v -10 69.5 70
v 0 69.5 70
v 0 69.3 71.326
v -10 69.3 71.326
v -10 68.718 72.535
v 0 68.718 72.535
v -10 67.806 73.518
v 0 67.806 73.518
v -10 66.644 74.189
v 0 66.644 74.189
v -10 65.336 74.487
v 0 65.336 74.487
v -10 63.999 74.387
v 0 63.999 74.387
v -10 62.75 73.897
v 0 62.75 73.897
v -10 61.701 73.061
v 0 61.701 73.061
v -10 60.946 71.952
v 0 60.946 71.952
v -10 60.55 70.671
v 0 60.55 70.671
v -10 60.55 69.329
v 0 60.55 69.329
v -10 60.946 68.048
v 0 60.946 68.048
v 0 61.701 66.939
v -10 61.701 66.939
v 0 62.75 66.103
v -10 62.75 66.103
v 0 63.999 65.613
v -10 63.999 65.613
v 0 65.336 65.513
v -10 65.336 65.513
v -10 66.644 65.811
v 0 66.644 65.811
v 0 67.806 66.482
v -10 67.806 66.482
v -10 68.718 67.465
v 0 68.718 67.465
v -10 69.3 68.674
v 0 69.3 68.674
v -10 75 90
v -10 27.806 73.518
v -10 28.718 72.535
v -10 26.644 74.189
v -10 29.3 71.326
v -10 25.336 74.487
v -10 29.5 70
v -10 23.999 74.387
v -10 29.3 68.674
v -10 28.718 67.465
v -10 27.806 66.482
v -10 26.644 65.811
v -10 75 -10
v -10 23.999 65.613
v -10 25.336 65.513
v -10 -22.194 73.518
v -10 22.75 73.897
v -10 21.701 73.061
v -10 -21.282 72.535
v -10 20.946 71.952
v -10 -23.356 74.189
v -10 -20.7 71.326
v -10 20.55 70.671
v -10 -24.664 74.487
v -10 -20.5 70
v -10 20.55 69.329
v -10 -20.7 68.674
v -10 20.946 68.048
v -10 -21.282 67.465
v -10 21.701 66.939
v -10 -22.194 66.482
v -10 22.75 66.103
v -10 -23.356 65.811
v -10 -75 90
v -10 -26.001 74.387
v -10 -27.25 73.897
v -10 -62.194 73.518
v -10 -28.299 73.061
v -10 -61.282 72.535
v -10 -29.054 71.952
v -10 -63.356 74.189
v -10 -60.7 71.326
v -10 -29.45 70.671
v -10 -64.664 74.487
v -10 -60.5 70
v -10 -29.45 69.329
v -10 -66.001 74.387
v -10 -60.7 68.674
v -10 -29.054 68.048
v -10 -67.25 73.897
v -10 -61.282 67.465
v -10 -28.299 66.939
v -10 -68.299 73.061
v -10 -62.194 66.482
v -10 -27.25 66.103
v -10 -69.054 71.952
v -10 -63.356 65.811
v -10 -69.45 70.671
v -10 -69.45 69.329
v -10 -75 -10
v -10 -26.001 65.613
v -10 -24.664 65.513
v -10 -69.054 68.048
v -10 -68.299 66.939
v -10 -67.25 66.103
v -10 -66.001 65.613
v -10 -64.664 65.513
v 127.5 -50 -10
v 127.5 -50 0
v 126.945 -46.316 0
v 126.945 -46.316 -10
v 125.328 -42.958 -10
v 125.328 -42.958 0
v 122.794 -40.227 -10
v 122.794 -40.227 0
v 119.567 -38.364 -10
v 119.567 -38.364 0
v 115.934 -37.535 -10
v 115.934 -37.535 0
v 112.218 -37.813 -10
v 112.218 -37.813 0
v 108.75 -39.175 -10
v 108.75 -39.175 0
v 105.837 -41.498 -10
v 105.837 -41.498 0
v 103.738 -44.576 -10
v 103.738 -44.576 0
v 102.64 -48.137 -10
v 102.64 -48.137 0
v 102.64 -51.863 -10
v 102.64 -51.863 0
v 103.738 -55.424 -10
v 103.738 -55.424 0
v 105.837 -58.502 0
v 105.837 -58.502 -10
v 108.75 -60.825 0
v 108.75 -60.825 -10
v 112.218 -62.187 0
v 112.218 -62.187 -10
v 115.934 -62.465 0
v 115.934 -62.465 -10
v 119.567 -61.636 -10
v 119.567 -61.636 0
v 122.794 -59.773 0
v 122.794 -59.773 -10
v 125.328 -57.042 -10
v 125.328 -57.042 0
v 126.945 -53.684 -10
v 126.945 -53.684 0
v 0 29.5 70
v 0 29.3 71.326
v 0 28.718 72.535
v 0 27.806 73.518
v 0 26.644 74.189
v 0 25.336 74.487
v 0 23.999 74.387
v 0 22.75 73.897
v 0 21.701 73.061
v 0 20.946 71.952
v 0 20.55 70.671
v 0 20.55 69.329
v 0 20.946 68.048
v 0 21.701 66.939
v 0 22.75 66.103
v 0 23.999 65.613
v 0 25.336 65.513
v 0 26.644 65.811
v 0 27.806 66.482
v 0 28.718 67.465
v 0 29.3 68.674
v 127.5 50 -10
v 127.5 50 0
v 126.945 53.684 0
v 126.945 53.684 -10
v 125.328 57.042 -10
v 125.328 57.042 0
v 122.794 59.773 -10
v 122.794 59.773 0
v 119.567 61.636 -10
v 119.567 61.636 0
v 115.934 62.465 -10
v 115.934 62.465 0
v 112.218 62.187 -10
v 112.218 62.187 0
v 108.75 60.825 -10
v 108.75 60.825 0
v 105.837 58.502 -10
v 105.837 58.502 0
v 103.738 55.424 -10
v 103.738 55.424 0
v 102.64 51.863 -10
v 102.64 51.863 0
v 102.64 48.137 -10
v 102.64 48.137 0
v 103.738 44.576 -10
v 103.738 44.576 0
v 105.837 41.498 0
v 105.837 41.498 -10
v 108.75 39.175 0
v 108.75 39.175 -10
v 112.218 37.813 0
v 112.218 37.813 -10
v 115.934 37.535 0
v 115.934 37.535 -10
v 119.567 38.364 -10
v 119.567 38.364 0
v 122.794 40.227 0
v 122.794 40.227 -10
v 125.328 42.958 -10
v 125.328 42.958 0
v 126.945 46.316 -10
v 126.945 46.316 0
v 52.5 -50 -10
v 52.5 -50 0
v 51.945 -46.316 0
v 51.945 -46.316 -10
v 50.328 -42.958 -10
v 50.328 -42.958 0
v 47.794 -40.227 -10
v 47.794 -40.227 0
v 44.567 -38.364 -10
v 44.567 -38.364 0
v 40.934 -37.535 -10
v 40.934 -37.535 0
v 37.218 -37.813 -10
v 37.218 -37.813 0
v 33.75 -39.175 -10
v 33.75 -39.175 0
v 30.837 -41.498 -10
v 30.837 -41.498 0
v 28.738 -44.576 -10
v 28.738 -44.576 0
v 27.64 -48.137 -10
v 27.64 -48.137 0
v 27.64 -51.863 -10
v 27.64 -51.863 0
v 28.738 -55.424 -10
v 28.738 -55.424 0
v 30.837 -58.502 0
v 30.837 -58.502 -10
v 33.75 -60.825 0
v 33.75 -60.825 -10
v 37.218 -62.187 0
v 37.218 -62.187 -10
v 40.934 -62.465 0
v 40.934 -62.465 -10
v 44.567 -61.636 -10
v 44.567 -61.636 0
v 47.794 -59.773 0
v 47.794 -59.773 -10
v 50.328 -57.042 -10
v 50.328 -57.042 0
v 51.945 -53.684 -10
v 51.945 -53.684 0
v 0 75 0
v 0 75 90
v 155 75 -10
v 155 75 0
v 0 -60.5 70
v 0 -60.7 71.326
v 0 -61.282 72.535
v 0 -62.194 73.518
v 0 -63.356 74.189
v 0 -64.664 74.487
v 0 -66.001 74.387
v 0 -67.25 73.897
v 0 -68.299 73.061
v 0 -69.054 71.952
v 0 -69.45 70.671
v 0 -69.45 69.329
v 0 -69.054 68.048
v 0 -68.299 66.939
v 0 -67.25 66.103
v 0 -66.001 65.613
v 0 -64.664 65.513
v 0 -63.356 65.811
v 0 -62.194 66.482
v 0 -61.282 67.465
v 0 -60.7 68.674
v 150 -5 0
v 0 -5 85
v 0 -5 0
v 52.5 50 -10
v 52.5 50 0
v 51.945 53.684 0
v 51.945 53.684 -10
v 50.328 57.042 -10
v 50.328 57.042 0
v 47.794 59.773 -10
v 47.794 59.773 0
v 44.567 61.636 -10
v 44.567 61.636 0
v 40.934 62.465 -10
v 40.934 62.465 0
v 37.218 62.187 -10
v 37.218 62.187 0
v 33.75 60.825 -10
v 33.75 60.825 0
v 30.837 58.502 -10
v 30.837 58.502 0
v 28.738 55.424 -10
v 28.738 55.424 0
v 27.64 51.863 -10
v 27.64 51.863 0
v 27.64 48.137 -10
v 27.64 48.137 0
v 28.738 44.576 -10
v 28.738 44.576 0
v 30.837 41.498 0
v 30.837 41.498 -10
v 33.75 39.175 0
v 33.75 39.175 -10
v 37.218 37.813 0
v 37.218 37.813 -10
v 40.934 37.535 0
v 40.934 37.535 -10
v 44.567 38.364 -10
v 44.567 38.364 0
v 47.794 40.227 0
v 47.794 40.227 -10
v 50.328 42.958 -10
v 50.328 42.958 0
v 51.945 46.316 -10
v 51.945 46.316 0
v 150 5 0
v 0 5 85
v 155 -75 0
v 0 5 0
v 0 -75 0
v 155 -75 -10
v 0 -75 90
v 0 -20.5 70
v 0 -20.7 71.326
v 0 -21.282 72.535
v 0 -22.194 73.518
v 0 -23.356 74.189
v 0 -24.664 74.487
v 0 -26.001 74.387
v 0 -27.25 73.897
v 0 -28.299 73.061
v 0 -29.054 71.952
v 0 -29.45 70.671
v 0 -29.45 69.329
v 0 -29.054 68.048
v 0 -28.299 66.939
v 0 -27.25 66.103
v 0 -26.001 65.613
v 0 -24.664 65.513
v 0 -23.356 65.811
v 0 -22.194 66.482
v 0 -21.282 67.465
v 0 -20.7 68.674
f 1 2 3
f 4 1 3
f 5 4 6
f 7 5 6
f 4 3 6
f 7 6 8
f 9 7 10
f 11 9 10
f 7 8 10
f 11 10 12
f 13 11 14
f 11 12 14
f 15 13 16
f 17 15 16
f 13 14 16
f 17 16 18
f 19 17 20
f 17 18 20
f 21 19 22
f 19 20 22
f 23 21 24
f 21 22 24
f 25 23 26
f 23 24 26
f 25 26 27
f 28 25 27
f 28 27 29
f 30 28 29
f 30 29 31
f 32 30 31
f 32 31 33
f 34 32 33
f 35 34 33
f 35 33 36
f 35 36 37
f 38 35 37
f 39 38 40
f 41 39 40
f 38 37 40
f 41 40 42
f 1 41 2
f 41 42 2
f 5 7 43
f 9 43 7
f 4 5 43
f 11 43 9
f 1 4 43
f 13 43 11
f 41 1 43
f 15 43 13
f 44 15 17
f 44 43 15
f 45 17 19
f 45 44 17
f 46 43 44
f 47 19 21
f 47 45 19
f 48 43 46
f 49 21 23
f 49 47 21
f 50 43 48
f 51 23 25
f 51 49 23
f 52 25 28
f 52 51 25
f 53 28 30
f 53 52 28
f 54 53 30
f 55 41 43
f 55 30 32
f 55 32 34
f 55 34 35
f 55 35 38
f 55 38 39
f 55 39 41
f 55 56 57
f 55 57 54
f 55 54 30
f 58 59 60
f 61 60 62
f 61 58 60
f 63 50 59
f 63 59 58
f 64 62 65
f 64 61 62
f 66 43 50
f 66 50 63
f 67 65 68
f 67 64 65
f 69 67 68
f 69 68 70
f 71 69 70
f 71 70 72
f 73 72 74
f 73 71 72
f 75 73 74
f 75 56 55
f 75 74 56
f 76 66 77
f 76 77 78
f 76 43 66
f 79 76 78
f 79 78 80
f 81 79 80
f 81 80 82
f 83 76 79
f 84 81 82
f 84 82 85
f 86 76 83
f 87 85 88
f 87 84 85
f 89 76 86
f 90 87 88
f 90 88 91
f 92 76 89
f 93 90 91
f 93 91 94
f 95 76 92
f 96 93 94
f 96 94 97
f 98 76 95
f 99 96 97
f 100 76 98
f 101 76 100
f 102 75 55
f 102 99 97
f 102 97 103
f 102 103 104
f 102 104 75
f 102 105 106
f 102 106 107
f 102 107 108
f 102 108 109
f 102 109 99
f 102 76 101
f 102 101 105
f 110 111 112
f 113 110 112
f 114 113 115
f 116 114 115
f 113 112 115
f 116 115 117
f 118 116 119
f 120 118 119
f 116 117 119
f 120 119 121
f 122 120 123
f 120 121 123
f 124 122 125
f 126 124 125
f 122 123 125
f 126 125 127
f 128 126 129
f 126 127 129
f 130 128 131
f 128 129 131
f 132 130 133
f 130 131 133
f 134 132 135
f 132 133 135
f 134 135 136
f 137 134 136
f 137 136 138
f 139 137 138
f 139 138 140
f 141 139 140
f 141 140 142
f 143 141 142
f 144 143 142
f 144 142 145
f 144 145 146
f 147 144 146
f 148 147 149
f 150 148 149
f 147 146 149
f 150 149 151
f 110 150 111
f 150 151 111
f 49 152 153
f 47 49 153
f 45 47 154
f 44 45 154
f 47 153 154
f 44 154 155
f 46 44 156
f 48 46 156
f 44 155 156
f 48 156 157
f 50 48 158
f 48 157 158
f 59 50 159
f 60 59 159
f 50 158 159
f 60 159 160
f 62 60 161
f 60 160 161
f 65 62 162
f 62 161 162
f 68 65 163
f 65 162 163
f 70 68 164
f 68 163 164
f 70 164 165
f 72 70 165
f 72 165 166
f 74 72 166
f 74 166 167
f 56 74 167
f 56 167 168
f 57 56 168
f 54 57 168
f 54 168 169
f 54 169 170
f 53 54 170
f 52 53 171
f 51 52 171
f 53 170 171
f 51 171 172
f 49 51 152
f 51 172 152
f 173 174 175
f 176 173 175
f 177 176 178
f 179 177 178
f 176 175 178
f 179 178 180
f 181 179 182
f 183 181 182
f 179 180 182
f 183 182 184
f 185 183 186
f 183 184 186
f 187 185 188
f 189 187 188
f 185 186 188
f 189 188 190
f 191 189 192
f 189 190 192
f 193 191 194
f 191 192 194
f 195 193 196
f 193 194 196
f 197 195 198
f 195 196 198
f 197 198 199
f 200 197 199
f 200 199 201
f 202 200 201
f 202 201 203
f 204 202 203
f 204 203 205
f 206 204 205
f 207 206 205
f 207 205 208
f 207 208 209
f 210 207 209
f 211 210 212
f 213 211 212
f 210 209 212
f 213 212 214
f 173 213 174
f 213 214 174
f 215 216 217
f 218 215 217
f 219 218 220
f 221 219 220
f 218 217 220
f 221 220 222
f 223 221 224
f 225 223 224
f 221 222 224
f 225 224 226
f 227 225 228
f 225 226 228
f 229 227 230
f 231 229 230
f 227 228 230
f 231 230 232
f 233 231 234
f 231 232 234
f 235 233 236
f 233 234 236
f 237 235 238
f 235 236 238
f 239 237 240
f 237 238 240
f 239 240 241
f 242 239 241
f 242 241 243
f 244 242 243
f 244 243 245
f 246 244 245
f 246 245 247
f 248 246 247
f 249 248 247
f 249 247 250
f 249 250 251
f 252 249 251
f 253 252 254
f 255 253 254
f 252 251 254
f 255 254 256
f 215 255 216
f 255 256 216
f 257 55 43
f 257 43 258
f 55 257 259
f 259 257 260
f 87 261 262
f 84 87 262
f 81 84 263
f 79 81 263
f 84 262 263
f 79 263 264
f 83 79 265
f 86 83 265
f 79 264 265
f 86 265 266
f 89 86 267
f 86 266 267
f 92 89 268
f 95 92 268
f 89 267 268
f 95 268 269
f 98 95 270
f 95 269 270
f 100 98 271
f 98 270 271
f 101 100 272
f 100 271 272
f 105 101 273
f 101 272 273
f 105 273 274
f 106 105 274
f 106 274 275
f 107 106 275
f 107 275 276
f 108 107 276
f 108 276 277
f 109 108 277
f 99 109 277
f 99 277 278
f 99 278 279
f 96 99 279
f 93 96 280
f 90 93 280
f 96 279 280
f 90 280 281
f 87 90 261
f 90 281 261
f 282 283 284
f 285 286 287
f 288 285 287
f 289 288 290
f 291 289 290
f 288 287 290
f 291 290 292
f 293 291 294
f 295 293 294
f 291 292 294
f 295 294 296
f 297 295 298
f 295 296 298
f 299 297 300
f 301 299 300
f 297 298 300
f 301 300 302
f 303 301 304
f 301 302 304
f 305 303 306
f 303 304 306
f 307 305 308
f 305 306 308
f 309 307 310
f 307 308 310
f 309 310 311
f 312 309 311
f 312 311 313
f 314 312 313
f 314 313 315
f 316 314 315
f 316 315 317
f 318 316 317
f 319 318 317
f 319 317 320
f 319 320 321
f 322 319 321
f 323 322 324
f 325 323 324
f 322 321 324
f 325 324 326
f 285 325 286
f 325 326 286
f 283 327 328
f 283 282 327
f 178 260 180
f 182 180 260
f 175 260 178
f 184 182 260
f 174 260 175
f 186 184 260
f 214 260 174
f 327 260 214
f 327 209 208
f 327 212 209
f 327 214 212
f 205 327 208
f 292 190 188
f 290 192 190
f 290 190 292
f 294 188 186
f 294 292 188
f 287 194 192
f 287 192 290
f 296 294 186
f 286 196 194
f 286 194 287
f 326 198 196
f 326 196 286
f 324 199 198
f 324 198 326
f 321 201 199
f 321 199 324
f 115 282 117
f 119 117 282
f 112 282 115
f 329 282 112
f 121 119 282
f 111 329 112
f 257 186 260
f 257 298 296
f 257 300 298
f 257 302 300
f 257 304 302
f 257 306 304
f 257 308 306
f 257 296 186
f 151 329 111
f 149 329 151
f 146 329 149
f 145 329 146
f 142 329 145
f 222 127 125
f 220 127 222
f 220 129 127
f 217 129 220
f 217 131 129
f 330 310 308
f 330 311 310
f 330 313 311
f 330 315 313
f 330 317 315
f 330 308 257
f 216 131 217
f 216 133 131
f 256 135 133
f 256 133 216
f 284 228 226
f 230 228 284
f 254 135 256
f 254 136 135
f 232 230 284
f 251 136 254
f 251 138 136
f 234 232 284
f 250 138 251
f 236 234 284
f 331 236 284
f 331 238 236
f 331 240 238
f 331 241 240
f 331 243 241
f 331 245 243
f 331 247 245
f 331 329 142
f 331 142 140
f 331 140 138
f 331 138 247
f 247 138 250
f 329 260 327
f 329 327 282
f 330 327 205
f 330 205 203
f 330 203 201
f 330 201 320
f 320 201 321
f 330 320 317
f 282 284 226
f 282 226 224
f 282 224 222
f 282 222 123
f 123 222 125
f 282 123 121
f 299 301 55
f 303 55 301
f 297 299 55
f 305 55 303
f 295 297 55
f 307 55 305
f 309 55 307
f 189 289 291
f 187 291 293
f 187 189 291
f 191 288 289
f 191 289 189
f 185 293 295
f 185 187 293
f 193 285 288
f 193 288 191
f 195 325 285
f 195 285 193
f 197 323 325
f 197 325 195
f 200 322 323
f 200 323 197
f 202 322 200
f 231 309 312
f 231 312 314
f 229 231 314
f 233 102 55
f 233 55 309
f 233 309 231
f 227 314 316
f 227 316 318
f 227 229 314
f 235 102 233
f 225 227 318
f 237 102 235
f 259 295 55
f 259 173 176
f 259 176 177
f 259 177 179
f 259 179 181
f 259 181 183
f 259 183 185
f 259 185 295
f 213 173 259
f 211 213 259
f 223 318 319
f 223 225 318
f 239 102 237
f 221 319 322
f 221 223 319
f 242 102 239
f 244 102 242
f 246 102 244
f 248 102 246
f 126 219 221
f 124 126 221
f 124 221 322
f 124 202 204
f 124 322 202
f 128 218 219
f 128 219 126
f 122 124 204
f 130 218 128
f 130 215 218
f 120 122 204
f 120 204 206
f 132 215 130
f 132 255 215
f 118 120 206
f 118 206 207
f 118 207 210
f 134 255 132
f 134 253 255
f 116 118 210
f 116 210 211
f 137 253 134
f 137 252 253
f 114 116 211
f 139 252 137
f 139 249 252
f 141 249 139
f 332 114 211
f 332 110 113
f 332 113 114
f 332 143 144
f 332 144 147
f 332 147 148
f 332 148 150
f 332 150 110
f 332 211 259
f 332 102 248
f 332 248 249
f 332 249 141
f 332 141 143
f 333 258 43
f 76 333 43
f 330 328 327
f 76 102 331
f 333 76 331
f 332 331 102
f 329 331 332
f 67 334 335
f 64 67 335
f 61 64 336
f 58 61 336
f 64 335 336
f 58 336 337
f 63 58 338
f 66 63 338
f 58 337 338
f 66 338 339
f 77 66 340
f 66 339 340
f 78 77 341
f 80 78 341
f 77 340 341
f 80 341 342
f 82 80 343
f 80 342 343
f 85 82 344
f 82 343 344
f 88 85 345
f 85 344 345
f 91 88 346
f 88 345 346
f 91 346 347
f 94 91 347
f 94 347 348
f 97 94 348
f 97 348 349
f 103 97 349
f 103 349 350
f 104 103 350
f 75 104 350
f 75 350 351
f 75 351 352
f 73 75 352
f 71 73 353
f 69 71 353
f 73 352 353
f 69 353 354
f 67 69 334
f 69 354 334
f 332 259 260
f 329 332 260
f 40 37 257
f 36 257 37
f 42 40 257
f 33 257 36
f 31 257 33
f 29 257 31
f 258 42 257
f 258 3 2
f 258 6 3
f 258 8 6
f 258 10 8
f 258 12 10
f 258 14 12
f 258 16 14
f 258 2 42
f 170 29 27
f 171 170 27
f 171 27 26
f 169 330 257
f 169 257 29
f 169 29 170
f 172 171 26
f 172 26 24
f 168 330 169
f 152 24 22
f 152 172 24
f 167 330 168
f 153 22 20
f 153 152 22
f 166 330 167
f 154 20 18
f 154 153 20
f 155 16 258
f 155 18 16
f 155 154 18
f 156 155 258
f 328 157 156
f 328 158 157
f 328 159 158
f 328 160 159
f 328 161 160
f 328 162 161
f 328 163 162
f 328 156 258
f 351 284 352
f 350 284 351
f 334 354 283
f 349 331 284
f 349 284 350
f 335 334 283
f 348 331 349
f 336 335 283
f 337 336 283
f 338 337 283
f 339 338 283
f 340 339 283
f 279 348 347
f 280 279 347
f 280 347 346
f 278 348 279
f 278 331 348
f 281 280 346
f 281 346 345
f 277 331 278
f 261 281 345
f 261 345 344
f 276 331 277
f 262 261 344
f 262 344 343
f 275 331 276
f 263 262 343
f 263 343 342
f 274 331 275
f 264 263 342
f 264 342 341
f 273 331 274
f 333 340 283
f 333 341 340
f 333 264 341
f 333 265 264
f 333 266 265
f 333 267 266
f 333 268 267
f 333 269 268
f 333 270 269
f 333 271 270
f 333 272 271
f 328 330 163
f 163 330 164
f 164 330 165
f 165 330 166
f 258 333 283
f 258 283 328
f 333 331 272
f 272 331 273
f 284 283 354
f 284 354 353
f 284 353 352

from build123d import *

# Parameters (mm, degrees)
F1_DEPTH      = 75
F1_DEPTH_BACK = 75
F3_DEPTH      = 5
F3_DEPTH_BACK = 5
F4_R          = 4.5
F5_DEPTH      = 10
F6_R          = 12.5
F7_DEPTH      = 10


with BuildPart() as f1:
    # F0 (on Front) → F1 (new body, two sides)
    with BuildSketch(Plane.XZ) as f1_sk:
        Polygon((0, 90), (-10, 90), (-10, -10), (155, -10), (155, 0), (0, 0), align=None)
    extrude(amount=F1_DEPTH)
    extrude(f1_sk.sketch, amount=-F1_DEPTH_BACK)

    # F2 (on Front) → F3 (join, two sides)
    with BuildSketch(Plane.XZ) as f3_sk:
        Polygon((150, 0), (0, 85), (0, 0), align=None)
    extrude(amount=F3_DEPTH)
    extrude(f3_sk.sketch, amount=-F3_DEPTH_BACK)

    # F4 (on Right) → F5 (cut, through all)
    with BuildSketch(Plane.YZ):
        with Locations((-65, 70)):
            Circle(F4_R)
        with Locations((-25, 70)):
            Circle(F4_R)
        with Locations((25, 70)):
            Circle(F4_R)
        with Locations((65, 70)):
            Circle(F4_R)
    extrude(amount=-F5_DEPTH, mode=Mode.SUBTRACT)

    # F6 (on Top) → F7 (cut, through all)
    with BuildSketch(Plane.XY):
        with Locations((40, 50)):
            Circle(F6_R)
        with Locations((115, 50)):
            Circle(F6_R)
        with Locations((115, -50)):
            Circle(F6_R)
        with Locations((40, -50)):
            Circle(F6_R)
    extrude(amount=-F7_DEPTH, mode=Mode.SUBTRACT)


solid = f1.part
